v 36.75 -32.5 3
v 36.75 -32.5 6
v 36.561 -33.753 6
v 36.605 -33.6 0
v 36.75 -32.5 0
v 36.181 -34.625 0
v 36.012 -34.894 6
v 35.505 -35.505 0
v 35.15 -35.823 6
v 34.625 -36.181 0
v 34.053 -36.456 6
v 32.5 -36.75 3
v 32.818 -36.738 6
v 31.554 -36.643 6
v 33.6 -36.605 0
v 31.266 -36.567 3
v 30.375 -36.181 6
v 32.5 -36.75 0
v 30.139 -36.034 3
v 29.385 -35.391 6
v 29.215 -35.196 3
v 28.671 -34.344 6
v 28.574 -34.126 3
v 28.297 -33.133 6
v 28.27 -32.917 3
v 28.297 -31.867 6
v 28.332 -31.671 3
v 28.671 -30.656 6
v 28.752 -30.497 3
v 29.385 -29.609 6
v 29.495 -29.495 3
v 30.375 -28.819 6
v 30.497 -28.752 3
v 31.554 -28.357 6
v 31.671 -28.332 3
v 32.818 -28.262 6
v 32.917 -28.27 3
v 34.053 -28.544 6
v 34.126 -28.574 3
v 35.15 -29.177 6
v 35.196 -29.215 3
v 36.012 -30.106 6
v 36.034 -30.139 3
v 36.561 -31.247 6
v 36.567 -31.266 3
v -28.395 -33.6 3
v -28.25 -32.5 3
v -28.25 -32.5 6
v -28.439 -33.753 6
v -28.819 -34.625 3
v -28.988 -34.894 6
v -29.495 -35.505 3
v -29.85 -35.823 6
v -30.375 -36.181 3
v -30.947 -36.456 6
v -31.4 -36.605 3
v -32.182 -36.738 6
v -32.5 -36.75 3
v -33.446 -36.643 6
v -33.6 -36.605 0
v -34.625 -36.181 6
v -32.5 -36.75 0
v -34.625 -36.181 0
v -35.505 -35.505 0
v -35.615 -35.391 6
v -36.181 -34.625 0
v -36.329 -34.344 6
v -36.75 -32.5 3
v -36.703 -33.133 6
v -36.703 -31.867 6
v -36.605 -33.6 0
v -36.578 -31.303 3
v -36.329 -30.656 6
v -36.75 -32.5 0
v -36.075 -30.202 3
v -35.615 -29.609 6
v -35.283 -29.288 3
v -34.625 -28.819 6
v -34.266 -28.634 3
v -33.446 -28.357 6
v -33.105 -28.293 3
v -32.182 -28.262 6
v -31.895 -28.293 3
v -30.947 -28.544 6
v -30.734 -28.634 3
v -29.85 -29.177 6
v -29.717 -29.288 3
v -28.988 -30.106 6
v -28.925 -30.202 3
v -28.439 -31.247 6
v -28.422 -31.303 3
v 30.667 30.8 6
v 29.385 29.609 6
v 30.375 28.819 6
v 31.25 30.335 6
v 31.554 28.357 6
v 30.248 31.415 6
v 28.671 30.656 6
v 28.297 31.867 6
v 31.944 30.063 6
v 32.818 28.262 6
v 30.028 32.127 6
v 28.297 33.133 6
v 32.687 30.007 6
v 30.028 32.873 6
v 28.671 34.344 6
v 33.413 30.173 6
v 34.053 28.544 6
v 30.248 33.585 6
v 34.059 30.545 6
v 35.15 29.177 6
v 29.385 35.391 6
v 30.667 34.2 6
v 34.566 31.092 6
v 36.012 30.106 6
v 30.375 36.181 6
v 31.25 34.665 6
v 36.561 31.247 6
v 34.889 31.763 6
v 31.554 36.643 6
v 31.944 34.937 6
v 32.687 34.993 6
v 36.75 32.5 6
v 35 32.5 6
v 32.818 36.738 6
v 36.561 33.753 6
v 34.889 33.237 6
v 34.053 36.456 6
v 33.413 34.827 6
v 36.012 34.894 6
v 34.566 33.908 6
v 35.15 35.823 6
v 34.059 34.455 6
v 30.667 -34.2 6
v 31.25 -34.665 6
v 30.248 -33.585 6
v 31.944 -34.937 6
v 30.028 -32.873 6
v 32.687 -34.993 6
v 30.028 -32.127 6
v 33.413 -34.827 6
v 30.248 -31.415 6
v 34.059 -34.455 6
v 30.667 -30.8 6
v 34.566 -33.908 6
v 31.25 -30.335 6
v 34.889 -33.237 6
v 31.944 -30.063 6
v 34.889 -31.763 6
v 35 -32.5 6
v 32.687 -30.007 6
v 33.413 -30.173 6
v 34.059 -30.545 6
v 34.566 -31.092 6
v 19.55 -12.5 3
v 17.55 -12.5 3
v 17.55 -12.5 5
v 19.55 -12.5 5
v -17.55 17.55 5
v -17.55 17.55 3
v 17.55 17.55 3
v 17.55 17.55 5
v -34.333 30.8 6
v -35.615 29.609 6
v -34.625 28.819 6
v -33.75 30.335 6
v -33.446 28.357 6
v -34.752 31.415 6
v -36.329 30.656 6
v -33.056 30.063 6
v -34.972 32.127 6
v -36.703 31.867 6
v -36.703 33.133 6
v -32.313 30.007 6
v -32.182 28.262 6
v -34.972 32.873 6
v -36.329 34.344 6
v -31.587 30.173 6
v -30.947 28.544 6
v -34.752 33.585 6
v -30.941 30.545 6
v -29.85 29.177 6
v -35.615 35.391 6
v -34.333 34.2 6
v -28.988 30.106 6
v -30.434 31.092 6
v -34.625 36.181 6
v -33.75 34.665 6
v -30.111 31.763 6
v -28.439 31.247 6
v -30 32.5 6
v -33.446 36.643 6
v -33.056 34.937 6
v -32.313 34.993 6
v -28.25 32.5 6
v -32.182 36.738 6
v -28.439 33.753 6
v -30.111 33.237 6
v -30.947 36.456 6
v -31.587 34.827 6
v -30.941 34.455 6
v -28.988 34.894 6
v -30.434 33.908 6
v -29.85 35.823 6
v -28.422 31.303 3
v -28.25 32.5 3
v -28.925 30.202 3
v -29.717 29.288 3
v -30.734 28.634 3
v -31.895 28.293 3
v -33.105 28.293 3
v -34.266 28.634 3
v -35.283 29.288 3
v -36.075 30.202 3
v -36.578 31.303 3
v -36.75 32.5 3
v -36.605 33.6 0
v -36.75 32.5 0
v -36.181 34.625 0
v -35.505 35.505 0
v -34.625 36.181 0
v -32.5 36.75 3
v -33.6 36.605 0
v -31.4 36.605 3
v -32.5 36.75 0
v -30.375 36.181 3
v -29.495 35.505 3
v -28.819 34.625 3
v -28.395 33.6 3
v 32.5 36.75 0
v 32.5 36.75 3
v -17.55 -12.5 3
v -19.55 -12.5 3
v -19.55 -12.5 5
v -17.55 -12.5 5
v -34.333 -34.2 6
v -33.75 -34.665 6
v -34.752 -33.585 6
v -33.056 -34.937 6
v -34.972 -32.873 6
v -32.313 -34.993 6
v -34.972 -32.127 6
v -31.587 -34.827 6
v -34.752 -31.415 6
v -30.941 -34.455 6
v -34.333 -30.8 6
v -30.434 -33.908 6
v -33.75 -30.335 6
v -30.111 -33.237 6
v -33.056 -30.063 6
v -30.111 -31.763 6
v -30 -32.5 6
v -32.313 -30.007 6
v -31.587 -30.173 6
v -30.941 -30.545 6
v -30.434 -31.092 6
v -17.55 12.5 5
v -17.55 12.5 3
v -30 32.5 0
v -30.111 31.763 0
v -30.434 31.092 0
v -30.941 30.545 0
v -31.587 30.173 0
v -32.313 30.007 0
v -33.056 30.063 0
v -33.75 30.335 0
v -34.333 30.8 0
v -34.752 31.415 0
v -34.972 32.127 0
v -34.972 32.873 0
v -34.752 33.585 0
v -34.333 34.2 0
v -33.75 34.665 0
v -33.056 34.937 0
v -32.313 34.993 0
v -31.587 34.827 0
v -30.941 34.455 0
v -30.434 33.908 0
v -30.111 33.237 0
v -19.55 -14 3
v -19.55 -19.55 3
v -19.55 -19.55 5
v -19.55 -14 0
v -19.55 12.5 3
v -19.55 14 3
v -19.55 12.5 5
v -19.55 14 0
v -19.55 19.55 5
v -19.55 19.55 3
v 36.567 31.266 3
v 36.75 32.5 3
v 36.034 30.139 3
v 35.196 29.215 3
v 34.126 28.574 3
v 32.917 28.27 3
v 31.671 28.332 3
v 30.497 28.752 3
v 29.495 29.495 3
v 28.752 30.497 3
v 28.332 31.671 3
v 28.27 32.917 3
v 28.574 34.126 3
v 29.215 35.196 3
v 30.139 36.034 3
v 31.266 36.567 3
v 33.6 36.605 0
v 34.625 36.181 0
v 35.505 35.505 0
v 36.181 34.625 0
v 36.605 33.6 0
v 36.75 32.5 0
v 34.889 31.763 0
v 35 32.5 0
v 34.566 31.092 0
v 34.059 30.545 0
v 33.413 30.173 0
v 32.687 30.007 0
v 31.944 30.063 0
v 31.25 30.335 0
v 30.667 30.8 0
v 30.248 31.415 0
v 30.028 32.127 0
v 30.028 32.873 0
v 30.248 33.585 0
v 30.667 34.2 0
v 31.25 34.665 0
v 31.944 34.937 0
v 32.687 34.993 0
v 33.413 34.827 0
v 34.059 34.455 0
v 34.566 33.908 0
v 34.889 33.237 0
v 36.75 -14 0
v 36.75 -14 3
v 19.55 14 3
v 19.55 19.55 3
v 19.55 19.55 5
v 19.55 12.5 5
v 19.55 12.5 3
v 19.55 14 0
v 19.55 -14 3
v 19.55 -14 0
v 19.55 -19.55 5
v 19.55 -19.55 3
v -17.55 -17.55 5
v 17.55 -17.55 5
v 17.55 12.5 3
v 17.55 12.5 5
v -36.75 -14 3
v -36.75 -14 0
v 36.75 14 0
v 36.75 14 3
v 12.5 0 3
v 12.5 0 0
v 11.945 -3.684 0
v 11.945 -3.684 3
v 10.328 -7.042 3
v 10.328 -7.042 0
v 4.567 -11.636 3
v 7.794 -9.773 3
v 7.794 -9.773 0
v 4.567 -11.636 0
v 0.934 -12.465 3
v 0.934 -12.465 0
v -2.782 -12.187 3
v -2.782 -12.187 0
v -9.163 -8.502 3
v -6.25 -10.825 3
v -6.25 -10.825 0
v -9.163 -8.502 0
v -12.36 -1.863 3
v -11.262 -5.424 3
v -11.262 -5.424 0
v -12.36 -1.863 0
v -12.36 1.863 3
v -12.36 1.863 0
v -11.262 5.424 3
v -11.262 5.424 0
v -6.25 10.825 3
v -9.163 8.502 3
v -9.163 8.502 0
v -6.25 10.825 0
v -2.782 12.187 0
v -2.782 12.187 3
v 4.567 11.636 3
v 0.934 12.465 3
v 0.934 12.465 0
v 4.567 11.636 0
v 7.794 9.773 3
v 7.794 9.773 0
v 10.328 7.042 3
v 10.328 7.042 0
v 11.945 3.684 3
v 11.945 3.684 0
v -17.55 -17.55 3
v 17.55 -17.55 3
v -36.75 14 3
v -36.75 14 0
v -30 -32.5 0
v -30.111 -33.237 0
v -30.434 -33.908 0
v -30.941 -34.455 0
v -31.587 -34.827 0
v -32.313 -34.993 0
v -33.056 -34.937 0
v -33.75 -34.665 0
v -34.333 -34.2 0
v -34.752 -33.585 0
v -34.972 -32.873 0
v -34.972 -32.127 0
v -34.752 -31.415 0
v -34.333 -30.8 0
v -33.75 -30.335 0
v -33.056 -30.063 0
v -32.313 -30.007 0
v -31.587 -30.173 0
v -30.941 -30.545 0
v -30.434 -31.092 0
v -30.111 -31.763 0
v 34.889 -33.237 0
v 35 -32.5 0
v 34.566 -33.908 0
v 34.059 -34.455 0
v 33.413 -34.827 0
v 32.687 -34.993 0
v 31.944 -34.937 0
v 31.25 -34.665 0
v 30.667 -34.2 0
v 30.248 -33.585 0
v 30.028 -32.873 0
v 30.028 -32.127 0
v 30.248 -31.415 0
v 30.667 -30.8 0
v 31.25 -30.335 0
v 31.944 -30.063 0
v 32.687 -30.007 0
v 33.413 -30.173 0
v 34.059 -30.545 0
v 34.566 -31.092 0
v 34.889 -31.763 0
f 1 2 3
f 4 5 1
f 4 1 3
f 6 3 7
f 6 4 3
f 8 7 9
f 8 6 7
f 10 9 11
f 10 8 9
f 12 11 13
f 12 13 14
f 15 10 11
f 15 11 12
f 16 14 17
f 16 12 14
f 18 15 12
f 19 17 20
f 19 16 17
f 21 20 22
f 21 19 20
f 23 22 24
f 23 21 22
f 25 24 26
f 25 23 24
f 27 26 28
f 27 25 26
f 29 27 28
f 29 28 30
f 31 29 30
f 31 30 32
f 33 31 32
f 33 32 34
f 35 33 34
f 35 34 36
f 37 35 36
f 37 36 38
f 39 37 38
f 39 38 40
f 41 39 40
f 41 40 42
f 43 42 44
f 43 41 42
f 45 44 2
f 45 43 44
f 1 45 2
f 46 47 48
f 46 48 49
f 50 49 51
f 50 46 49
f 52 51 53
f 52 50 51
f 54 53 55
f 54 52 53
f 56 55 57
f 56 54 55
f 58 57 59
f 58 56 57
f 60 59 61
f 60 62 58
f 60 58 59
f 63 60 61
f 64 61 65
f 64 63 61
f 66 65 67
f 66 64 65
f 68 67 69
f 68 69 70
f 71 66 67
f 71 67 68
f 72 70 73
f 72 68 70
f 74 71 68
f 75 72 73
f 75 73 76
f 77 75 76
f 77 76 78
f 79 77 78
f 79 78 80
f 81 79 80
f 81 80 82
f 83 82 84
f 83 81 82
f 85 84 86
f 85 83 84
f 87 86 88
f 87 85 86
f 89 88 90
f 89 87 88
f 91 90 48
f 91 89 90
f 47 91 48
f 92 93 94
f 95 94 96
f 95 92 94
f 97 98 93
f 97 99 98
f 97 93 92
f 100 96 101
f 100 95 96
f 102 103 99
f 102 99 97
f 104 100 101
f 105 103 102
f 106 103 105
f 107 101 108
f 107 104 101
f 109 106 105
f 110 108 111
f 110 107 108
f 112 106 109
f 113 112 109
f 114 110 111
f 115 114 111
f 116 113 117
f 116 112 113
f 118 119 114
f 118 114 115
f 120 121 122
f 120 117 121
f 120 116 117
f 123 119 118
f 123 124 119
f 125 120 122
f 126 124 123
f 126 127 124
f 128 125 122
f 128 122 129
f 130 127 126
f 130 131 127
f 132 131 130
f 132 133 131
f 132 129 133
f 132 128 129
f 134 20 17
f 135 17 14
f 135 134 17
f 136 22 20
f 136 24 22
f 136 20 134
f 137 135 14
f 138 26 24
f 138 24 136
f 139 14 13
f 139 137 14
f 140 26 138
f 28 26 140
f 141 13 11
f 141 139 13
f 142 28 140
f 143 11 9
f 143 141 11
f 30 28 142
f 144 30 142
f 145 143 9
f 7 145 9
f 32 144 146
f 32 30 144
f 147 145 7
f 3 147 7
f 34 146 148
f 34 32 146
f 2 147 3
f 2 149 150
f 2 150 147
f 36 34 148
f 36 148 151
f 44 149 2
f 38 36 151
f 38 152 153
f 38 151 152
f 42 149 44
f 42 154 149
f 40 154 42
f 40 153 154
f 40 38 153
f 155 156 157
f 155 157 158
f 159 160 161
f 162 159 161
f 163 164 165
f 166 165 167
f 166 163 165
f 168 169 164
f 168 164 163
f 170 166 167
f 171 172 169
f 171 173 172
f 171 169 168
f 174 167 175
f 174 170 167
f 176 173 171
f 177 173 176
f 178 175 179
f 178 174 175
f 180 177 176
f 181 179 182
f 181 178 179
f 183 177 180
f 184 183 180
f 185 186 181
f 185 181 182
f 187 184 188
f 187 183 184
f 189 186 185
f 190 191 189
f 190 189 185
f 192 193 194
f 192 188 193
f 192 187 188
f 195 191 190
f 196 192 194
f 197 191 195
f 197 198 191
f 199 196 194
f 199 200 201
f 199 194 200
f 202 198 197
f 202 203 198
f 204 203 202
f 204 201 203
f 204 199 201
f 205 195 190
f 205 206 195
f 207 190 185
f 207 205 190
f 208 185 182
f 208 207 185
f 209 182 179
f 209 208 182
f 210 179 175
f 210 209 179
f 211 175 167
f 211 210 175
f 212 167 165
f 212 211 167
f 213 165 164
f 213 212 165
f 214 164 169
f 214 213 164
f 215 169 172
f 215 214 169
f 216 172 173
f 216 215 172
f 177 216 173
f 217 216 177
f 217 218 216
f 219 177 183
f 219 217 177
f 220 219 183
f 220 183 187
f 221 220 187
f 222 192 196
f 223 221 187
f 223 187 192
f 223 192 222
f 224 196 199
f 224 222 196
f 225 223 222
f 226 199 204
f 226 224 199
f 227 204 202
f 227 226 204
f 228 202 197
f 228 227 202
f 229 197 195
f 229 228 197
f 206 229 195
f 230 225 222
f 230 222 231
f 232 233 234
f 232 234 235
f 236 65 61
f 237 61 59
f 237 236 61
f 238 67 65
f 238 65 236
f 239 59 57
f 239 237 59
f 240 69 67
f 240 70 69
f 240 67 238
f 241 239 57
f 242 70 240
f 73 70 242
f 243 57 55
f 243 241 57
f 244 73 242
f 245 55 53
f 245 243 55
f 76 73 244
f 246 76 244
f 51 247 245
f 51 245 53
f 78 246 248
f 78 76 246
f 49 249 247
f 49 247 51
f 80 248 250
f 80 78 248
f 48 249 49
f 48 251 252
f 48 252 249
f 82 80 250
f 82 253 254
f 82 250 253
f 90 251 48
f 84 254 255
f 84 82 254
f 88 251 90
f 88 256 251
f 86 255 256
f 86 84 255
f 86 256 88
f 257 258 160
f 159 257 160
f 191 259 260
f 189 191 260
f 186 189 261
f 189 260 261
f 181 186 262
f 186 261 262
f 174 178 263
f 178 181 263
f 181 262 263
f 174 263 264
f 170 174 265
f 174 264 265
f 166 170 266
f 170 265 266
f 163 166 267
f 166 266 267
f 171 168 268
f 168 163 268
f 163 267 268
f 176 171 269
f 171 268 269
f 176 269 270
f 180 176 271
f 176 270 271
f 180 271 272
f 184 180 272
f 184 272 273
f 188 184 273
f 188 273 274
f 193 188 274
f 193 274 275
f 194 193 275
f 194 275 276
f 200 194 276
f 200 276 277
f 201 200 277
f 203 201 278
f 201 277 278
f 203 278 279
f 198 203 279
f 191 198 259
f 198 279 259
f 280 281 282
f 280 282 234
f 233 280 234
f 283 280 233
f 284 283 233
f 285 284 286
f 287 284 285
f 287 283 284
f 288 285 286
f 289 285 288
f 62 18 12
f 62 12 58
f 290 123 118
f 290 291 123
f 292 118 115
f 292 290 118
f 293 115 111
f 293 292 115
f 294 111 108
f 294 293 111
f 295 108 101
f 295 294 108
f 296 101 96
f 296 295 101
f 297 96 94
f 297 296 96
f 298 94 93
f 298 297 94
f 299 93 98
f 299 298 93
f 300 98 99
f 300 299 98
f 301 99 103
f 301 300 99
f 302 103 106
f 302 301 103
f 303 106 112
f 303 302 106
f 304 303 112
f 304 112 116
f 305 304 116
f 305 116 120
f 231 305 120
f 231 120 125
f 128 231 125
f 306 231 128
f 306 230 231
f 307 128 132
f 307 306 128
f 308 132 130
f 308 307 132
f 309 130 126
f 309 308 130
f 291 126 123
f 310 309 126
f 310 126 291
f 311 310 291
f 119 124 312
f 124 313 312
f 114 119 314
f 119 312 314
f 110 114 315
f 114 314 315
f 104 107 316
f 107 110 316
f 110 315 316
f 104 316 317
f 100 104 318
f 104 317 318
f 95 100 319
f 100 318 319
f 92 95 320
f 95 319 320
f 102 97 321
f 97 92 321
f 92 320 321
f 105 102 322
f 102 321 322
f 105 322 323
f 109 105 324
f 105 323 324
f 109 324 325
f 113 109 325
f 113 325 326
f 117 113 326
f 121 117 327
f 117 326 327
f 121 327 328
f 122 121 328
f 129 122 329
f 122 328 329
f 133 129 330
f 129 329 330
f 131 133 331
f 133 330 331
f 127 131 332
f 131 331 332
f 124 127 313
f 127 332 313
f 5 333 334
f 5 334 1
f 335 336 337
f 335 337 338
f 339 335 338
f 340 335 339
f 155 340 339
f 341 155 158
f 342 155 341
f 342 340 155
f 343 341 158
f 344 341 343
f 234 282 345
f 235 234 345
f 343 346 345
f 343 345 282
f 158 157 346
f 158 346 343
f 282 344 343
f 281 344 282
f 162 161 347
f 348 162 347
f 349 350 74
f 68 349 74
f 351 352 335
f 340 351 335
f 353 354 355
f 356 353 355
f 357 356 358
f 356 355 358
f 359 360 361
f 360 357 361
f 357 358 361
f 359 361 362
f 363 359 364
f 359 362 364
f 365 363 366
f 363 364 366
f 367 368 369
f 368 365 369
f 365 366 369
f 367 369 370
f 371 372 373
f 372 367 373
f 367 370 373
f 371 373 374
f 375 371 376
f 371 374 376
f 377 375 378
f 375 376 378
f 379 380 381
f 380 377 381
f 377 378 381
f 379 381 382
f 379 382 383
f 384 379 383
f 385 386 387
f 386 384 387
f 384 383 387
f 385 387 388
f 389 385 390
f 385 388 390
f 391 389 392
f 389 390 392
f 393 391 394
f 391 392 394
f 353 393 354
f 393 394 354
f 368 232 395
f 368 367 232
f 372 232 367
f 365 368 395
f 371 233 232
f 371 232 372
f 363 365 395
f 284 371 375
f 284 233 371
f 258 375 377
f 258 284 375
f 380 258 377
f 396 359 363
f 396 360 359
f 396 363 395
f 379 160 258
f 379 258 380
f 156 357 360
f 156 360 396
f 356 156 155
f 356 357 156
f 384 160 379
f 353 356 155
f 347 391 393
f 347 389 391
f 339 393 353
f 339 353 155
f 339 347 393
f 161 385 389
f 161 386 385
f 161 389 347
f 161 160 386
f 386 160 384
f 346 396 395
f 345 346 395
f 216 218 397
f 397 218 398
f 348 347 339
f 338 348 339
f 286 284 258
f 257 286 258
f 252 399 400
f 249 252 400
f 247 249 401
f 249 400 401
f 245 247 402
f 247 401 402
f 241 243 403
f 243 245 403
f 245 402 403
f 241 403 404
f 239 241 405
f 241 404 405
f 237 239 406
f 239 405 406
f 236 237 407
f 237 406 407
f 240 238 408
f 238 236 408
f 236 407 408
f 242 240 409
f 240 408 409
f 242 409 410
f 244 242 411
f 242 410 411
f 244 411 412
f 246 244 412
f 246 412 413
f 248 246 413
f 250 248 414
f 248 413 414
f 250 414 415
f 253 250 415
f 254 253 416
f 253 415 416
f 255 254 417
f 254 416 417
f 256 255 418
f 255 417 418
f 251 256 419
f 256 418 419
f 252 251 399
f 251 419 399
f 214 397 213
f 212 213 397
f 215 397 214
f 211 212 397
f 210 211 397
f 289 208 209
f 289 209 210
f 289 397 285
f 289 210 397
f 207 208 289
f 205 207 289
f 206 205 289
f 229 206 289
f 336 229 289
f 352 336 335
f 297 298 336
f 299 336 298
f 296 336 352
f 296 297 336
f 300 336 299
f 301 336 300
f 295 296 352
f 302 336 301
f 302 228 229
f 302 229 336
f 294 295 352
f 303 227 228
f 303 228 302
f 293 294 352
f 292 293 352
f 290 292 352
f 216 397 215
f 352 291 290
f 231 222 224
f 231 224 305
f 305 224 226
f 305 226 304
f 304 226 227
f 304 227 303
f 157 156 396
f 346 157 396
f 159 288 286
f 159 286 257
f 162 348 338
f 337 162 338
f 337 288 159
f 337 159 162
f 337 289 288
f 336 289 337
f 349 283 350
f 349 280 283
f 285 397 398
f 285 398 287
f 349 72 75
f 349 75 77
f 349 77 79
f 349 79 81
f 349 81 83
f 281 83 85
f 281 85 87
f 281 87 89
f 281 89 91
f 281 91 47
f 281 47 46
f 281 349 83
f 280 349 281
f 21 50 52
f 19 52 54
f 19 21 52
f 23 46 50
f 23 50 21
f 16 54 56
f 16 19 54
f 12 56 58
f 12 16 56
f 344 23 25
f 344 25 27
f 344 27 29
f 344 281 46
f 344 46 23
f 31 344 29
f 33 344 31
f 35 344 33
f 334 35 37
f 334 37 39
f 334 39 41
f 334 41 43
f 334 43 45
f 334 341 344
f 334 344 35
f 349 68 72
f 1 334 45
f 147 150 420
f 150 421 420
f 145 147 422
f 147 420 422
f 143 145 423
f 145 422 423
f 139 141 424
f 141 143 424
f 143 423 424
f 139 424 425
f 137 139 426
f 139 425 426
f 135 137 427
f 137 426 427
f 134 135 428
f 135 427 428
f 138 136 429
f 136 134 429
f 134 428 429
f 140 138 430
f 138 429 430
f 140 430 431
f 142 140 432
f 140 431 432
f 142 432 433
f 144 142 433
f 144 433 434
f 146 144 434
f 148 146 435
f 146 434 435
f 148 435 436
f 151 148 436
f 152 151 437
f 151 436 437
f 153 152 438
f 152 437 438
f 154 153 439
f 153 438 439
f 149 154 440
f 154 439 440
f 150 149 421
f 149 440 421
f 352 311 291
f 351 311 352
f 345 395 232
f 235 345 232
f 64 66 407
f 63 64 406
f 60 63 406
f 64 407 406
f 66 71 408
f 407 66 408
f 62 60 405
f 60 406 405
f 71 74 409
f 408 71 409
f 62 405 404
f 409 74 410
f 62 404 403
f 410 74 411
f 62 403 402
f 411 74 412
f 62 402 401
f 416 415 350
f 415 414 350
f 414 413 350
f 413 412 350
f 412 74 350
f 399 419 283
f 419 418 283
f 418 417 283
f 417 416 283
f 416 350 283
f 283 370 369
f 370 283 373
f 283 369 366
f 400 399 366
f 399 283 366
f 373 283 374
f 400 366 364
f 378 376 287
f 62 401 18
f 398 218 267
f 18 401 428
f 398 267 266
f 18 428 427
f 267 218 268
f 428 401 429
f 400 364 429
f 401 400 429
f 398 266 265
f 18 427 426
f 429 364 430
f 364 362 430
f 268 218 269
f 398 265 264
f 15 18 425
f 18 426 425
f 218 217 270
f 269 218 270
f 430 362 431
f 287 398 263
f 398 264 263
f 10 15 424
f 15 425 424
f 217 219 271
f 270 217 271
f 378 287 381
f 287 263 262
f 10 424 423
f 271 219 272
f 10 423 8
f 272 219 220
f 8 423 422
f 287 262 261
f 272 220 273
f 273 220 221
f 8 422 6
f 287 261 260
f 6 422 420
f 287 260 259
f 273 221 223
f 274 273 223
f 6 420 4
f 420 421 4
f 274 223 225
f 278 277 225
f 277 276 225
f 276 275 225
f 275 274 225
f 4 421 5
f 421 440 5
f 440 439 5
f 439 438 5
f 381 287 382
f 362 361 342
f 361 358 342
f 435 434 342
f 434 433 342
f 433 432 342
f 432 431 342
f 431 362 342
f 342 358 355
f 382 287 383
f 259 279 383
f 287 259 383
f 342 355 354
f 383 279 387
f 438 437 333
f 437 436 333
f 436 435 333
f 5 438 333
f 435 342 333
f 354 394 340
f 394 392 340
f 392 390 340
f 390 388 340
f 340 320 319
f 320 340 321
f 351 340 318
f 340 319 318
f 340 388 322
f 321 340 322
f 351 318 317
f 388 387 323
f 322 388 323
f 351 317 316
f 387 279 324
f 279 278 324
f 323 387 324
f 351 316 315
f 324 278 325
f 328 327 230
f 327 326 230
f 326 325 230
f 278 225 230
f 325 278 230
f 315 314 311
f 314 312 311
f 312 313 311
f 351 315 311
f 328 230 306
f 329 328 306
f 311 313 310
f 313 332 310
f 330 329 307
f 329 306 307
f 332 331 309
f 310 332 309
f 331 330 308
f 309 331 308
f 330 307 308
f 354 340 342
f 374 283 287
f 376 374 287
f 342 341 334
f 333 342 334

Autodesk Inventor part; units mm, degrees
ref_plane "YZ Plane" through (0, 0, 0) normal (1, 0, 0) x (0, 1, 0)
ref_plane "XZ Plane" through (0, 0, 0) normal (0, 1, 0) x (-1, 0, 0)
ref_plane "XY Plane" through (0, 0, 0) normal (0, 0, 1) x (1, 0, 0)
sketch "Sketch1" plane through (0, 0, 0) normal (0, 0, 1) x (1, 0, 0)
  line L0 (-32.5, 32.5) -> (32.5, 32.5) construction
  line L1 (32.5, 32.5) -> (32.5, -32.5) construction
  line L2 (32.5, -32.5) -> (-32.5, -32.5) construction
  line L3 (-32.5, -32.5) -> (-32.5, 32.5) construction
  circle A0 centre (-32.5, 32.5) radius 2.5
  circle A1 centre (32.5, 32.5) radius 2.5
  circle A2 centre (-32.5, -32.5) radius 2.5
  circle A3 centre (32.5, -32.5) radius 2.5
  line L4 (-32.5, 32.5) -> (32.5, -32.5) construction
  circle A4 centre (0, 0) radius 12.5
  circle A5 centre (-32.5, 32.5) radius 4.25
  circle A6 centre (32.5, 32.5) radius 4.25
  circle A7 centre (-32.5, -32.5) radius 4.25
  circle A8 centre (32.5, -32.5) radius 4.25
  line L5 (-32.5, 36.75) -> (32.5, 36.75)
  line L6 (32.5, -36.75) -> (-32.5, -36.75)
  line L7 (-36.75, 32.5) -> (-36.75, -32.5)
  line L8 (36.75, 32.5) -> (36.75, -32.5)
  dimension "d1" = 65
  dimension "d2" = 5
  dimension "d4" = 25
  dimension "d16" = 8.5
extrude "Extrusion1" add sketch "Sketch1" along normal blind 3
sketch "Sketch2" plane through (0, 0, 3) normal (0, 0, 1) x (1, 0, 0)
  line L0 (-17.55, 17.55) -> (17.55, 17.55)
  line L1 (17.55, -17.55) -> (-17.55, -17.55)
  line L2 (0, 17.55) -> (0, 36.75) construction
  line L3 (0, -17.55) -> (0, -36.75) construction
  line L4 (-19.55, 19.55) -> (19.55, 19.55)
  line L5 (19.55, -19.55) -> (-19.55, -19.55)
  line L6 (17.55, 17.55) -> (19.55, 19.55) construction
  line L7 (-17.55, 17.55) -> (-19.55, 19.55) construction
  line L8 (-19.55, -19.55) -> (-17.55, -17.55) construction
  line L9 (17.55, -17.55) -> (19.55, -19.55) construction
  circle A0 centre (0, 0) radius 12.5 projected
  circle A1 centre (-32.5, -32.5) radius 2.5 projected
  circle A2 centre (32.5, -32.5) radius 2.5 projected
  circle A3 centre (32.5, 32.5) radius 2.5 projected
  circle A4 centre (-32.5, 32.5) radius 2.5 projected
  arc A5 (32.5, -36.75) -> (36.75, -32.5) centre (32.5, -32.5) ccw projected
  line L10 (36.75, -32.5) -> (36.75, 32.5) projected
  arc A6 (36.75, 32.5) -> (32.5, 36.75) centre (32.5, 32.5) ccw projected
  line L11 (32.5, 36.75) -> (-32.5, 36.75) projected
  arc A7 (-32.5, 36.75) -> (-36.75, 32.5) centre (-32.5, 32.5) ccw projected
  line L12 (-36.75, 32.5) -> (-36.75, -32.5) projected
  arc A8 (-36.75, -32.5) -> (-32.5, -36.75) centre (-32.5, -32.5) ccw projected
  line L13 (-32.5, -36.75) -> (32.5, -36.75) projected
  line L14 (-32.5, -36.75) -> (32.5, -36.75) projected
  line L15 (36.75, -32.5) -> (36.75, 32.5) projected
  line L16 (32.5, 36.75) -> (-32.5, 36.75) projected
  line L17 (-19.55, 12.5) -> (-17.55, 12.5)
  line L18 (-19.55, -12.5) -> (-17.55, -12.5)
  line L19 (-19.55, -19.55) -> (-19.55, -12.5)
  line L20 (-19.55, 12.5) -> (-19.55, 19.55)
  line L21 (-17.55, -17.55) -> (-17.55, -12.5)
  line L22 (-17.55, 12.5) -> (-17.55, 17.55)
  line L23 (17.55, 12.5) -> (19.55, 12.5)
  line L24 (17.55, -12.5) -> (19.55, -12.5)
  line L25 (17.55, 17.55) -> (17.55, 12.5)
  line L26 (17.55, -12.5) -> (17.55, -17.55)
  line L27 (19.55, 19.55) -> (19.55, 12.5)
  line L28 (19.55, -12.5) -> (19.55, -19.55)
  line L29 (-17.55, 17.55) -> (0, 0) construction
  line L30 (0, 0) -> (-17.55, -17.55) construction
  line L31 (0, 0) -> (17.55, 17.55) construction
  line L32 (0, 0) -> (17.55, -17.55) construction
  dimension "d7" = 35.1
  dimension "d23" = 25
  dimension "d24" = 2
  dimension "d31" = 2
extrude "Extrusion2" add sketch "Sketch2" along normal blind 2 contours L22 L17 L20 L4 L27 L23 L25 L0 | L26 L24 L28 L5 L19 L18 L21 L1
extrude "Extrusion4" add sketch "Sketch1" along normal blind 6 contours A5 | A6 | A7 | A8
sketch "Sketch4" plane through (0, 0, 3) normal (0, 0, 1) x (1, 0, 0)
  line L0 (19.55, 19.55) -> (19.55, 12.5) projected
  line L1 (-19.55, 19.55) -> (19.55, 19.55) projected
  arc A0 (36.75, -32.5) -> (32.5, -36.75) centre (32.5, -32.5) ccw projected
  line L2 (36.75, -32.5) -> (36.75, 32.5) projected
  arc A1 (32.5, 36.75) -> (36.75, 32.5) centre (32.5, 32.5) ccw projected
  line L3 (32.5, 36.75) -> (-32.5, 36.75) projected
  arc A2 (-36.75, 32.5) -> (-32.5, 36.75) centre (-32.5, 32.5) ccw projected
  line L4 (-36.75, 32.5) -> (-36.75, -32.5) projected
  arc A3 (-32.5, -36.75) -> (-36.75, -32.5) centre (-32.5, -32.5) ccw projected
  line L5 (-32.5, -36.75) -> (32.5, -36.75) projected
  line L6 (-19.55, 14) -> (-19.55, -14)
  line L7 (-19.55, -14) -> (-36.75, -14)
  line L8 (-36.75, -14) -> (-36.75, 14)
  line L9 (-36.75, 14) -> (-19.55, 14)
  line L10 (32.5, 36.75) -> (-32.5, 36.75) construction
  line L11 (0, 36.75) -> (0, -36.75) construction
  line L12 (19.55, 14) -> (19.55, -14)
  line L13 (19.55, -14) -> (36.75, -14)
  line L14 (36.75, -14) -> (36.75, 14)
  line L15 (36.75, 14) -> (19.55, 14)
  line L16 (-17.55, 17.55) -> (-17.55, 12.5) projected
  line L17 (-17.55, 12.5) -> (-19.55, 12.5) projected
  line L18 (-19.55, 12.5) -> (-19.55, 19.55) projected
  line L19 (19.55, 12.5) -> (17.55, 12.5) projected
  line L20 (17.55, 12.5) -> (17.55, 17.55) projected
  line L21 (17.55, 17.55) -> (-17.55, 17.55) projected
  point P0 (0, 0)
  point P1 (-36.75, 0)
  point P2 (36.75, 0)
  dimension "d20" = 28
extrude "Extrusion5" cut sketch "Sketch4" against normal through all contours L15 L2 L13 L12 L0 | L6 L7 L4 L9
sketch "Sketch5" plane through (0, 0, 5) normal (0, 0, 1) x (1, 0, 0)
  point P0 (0, 0)
properties part number "35mm glass cuvette holder"
